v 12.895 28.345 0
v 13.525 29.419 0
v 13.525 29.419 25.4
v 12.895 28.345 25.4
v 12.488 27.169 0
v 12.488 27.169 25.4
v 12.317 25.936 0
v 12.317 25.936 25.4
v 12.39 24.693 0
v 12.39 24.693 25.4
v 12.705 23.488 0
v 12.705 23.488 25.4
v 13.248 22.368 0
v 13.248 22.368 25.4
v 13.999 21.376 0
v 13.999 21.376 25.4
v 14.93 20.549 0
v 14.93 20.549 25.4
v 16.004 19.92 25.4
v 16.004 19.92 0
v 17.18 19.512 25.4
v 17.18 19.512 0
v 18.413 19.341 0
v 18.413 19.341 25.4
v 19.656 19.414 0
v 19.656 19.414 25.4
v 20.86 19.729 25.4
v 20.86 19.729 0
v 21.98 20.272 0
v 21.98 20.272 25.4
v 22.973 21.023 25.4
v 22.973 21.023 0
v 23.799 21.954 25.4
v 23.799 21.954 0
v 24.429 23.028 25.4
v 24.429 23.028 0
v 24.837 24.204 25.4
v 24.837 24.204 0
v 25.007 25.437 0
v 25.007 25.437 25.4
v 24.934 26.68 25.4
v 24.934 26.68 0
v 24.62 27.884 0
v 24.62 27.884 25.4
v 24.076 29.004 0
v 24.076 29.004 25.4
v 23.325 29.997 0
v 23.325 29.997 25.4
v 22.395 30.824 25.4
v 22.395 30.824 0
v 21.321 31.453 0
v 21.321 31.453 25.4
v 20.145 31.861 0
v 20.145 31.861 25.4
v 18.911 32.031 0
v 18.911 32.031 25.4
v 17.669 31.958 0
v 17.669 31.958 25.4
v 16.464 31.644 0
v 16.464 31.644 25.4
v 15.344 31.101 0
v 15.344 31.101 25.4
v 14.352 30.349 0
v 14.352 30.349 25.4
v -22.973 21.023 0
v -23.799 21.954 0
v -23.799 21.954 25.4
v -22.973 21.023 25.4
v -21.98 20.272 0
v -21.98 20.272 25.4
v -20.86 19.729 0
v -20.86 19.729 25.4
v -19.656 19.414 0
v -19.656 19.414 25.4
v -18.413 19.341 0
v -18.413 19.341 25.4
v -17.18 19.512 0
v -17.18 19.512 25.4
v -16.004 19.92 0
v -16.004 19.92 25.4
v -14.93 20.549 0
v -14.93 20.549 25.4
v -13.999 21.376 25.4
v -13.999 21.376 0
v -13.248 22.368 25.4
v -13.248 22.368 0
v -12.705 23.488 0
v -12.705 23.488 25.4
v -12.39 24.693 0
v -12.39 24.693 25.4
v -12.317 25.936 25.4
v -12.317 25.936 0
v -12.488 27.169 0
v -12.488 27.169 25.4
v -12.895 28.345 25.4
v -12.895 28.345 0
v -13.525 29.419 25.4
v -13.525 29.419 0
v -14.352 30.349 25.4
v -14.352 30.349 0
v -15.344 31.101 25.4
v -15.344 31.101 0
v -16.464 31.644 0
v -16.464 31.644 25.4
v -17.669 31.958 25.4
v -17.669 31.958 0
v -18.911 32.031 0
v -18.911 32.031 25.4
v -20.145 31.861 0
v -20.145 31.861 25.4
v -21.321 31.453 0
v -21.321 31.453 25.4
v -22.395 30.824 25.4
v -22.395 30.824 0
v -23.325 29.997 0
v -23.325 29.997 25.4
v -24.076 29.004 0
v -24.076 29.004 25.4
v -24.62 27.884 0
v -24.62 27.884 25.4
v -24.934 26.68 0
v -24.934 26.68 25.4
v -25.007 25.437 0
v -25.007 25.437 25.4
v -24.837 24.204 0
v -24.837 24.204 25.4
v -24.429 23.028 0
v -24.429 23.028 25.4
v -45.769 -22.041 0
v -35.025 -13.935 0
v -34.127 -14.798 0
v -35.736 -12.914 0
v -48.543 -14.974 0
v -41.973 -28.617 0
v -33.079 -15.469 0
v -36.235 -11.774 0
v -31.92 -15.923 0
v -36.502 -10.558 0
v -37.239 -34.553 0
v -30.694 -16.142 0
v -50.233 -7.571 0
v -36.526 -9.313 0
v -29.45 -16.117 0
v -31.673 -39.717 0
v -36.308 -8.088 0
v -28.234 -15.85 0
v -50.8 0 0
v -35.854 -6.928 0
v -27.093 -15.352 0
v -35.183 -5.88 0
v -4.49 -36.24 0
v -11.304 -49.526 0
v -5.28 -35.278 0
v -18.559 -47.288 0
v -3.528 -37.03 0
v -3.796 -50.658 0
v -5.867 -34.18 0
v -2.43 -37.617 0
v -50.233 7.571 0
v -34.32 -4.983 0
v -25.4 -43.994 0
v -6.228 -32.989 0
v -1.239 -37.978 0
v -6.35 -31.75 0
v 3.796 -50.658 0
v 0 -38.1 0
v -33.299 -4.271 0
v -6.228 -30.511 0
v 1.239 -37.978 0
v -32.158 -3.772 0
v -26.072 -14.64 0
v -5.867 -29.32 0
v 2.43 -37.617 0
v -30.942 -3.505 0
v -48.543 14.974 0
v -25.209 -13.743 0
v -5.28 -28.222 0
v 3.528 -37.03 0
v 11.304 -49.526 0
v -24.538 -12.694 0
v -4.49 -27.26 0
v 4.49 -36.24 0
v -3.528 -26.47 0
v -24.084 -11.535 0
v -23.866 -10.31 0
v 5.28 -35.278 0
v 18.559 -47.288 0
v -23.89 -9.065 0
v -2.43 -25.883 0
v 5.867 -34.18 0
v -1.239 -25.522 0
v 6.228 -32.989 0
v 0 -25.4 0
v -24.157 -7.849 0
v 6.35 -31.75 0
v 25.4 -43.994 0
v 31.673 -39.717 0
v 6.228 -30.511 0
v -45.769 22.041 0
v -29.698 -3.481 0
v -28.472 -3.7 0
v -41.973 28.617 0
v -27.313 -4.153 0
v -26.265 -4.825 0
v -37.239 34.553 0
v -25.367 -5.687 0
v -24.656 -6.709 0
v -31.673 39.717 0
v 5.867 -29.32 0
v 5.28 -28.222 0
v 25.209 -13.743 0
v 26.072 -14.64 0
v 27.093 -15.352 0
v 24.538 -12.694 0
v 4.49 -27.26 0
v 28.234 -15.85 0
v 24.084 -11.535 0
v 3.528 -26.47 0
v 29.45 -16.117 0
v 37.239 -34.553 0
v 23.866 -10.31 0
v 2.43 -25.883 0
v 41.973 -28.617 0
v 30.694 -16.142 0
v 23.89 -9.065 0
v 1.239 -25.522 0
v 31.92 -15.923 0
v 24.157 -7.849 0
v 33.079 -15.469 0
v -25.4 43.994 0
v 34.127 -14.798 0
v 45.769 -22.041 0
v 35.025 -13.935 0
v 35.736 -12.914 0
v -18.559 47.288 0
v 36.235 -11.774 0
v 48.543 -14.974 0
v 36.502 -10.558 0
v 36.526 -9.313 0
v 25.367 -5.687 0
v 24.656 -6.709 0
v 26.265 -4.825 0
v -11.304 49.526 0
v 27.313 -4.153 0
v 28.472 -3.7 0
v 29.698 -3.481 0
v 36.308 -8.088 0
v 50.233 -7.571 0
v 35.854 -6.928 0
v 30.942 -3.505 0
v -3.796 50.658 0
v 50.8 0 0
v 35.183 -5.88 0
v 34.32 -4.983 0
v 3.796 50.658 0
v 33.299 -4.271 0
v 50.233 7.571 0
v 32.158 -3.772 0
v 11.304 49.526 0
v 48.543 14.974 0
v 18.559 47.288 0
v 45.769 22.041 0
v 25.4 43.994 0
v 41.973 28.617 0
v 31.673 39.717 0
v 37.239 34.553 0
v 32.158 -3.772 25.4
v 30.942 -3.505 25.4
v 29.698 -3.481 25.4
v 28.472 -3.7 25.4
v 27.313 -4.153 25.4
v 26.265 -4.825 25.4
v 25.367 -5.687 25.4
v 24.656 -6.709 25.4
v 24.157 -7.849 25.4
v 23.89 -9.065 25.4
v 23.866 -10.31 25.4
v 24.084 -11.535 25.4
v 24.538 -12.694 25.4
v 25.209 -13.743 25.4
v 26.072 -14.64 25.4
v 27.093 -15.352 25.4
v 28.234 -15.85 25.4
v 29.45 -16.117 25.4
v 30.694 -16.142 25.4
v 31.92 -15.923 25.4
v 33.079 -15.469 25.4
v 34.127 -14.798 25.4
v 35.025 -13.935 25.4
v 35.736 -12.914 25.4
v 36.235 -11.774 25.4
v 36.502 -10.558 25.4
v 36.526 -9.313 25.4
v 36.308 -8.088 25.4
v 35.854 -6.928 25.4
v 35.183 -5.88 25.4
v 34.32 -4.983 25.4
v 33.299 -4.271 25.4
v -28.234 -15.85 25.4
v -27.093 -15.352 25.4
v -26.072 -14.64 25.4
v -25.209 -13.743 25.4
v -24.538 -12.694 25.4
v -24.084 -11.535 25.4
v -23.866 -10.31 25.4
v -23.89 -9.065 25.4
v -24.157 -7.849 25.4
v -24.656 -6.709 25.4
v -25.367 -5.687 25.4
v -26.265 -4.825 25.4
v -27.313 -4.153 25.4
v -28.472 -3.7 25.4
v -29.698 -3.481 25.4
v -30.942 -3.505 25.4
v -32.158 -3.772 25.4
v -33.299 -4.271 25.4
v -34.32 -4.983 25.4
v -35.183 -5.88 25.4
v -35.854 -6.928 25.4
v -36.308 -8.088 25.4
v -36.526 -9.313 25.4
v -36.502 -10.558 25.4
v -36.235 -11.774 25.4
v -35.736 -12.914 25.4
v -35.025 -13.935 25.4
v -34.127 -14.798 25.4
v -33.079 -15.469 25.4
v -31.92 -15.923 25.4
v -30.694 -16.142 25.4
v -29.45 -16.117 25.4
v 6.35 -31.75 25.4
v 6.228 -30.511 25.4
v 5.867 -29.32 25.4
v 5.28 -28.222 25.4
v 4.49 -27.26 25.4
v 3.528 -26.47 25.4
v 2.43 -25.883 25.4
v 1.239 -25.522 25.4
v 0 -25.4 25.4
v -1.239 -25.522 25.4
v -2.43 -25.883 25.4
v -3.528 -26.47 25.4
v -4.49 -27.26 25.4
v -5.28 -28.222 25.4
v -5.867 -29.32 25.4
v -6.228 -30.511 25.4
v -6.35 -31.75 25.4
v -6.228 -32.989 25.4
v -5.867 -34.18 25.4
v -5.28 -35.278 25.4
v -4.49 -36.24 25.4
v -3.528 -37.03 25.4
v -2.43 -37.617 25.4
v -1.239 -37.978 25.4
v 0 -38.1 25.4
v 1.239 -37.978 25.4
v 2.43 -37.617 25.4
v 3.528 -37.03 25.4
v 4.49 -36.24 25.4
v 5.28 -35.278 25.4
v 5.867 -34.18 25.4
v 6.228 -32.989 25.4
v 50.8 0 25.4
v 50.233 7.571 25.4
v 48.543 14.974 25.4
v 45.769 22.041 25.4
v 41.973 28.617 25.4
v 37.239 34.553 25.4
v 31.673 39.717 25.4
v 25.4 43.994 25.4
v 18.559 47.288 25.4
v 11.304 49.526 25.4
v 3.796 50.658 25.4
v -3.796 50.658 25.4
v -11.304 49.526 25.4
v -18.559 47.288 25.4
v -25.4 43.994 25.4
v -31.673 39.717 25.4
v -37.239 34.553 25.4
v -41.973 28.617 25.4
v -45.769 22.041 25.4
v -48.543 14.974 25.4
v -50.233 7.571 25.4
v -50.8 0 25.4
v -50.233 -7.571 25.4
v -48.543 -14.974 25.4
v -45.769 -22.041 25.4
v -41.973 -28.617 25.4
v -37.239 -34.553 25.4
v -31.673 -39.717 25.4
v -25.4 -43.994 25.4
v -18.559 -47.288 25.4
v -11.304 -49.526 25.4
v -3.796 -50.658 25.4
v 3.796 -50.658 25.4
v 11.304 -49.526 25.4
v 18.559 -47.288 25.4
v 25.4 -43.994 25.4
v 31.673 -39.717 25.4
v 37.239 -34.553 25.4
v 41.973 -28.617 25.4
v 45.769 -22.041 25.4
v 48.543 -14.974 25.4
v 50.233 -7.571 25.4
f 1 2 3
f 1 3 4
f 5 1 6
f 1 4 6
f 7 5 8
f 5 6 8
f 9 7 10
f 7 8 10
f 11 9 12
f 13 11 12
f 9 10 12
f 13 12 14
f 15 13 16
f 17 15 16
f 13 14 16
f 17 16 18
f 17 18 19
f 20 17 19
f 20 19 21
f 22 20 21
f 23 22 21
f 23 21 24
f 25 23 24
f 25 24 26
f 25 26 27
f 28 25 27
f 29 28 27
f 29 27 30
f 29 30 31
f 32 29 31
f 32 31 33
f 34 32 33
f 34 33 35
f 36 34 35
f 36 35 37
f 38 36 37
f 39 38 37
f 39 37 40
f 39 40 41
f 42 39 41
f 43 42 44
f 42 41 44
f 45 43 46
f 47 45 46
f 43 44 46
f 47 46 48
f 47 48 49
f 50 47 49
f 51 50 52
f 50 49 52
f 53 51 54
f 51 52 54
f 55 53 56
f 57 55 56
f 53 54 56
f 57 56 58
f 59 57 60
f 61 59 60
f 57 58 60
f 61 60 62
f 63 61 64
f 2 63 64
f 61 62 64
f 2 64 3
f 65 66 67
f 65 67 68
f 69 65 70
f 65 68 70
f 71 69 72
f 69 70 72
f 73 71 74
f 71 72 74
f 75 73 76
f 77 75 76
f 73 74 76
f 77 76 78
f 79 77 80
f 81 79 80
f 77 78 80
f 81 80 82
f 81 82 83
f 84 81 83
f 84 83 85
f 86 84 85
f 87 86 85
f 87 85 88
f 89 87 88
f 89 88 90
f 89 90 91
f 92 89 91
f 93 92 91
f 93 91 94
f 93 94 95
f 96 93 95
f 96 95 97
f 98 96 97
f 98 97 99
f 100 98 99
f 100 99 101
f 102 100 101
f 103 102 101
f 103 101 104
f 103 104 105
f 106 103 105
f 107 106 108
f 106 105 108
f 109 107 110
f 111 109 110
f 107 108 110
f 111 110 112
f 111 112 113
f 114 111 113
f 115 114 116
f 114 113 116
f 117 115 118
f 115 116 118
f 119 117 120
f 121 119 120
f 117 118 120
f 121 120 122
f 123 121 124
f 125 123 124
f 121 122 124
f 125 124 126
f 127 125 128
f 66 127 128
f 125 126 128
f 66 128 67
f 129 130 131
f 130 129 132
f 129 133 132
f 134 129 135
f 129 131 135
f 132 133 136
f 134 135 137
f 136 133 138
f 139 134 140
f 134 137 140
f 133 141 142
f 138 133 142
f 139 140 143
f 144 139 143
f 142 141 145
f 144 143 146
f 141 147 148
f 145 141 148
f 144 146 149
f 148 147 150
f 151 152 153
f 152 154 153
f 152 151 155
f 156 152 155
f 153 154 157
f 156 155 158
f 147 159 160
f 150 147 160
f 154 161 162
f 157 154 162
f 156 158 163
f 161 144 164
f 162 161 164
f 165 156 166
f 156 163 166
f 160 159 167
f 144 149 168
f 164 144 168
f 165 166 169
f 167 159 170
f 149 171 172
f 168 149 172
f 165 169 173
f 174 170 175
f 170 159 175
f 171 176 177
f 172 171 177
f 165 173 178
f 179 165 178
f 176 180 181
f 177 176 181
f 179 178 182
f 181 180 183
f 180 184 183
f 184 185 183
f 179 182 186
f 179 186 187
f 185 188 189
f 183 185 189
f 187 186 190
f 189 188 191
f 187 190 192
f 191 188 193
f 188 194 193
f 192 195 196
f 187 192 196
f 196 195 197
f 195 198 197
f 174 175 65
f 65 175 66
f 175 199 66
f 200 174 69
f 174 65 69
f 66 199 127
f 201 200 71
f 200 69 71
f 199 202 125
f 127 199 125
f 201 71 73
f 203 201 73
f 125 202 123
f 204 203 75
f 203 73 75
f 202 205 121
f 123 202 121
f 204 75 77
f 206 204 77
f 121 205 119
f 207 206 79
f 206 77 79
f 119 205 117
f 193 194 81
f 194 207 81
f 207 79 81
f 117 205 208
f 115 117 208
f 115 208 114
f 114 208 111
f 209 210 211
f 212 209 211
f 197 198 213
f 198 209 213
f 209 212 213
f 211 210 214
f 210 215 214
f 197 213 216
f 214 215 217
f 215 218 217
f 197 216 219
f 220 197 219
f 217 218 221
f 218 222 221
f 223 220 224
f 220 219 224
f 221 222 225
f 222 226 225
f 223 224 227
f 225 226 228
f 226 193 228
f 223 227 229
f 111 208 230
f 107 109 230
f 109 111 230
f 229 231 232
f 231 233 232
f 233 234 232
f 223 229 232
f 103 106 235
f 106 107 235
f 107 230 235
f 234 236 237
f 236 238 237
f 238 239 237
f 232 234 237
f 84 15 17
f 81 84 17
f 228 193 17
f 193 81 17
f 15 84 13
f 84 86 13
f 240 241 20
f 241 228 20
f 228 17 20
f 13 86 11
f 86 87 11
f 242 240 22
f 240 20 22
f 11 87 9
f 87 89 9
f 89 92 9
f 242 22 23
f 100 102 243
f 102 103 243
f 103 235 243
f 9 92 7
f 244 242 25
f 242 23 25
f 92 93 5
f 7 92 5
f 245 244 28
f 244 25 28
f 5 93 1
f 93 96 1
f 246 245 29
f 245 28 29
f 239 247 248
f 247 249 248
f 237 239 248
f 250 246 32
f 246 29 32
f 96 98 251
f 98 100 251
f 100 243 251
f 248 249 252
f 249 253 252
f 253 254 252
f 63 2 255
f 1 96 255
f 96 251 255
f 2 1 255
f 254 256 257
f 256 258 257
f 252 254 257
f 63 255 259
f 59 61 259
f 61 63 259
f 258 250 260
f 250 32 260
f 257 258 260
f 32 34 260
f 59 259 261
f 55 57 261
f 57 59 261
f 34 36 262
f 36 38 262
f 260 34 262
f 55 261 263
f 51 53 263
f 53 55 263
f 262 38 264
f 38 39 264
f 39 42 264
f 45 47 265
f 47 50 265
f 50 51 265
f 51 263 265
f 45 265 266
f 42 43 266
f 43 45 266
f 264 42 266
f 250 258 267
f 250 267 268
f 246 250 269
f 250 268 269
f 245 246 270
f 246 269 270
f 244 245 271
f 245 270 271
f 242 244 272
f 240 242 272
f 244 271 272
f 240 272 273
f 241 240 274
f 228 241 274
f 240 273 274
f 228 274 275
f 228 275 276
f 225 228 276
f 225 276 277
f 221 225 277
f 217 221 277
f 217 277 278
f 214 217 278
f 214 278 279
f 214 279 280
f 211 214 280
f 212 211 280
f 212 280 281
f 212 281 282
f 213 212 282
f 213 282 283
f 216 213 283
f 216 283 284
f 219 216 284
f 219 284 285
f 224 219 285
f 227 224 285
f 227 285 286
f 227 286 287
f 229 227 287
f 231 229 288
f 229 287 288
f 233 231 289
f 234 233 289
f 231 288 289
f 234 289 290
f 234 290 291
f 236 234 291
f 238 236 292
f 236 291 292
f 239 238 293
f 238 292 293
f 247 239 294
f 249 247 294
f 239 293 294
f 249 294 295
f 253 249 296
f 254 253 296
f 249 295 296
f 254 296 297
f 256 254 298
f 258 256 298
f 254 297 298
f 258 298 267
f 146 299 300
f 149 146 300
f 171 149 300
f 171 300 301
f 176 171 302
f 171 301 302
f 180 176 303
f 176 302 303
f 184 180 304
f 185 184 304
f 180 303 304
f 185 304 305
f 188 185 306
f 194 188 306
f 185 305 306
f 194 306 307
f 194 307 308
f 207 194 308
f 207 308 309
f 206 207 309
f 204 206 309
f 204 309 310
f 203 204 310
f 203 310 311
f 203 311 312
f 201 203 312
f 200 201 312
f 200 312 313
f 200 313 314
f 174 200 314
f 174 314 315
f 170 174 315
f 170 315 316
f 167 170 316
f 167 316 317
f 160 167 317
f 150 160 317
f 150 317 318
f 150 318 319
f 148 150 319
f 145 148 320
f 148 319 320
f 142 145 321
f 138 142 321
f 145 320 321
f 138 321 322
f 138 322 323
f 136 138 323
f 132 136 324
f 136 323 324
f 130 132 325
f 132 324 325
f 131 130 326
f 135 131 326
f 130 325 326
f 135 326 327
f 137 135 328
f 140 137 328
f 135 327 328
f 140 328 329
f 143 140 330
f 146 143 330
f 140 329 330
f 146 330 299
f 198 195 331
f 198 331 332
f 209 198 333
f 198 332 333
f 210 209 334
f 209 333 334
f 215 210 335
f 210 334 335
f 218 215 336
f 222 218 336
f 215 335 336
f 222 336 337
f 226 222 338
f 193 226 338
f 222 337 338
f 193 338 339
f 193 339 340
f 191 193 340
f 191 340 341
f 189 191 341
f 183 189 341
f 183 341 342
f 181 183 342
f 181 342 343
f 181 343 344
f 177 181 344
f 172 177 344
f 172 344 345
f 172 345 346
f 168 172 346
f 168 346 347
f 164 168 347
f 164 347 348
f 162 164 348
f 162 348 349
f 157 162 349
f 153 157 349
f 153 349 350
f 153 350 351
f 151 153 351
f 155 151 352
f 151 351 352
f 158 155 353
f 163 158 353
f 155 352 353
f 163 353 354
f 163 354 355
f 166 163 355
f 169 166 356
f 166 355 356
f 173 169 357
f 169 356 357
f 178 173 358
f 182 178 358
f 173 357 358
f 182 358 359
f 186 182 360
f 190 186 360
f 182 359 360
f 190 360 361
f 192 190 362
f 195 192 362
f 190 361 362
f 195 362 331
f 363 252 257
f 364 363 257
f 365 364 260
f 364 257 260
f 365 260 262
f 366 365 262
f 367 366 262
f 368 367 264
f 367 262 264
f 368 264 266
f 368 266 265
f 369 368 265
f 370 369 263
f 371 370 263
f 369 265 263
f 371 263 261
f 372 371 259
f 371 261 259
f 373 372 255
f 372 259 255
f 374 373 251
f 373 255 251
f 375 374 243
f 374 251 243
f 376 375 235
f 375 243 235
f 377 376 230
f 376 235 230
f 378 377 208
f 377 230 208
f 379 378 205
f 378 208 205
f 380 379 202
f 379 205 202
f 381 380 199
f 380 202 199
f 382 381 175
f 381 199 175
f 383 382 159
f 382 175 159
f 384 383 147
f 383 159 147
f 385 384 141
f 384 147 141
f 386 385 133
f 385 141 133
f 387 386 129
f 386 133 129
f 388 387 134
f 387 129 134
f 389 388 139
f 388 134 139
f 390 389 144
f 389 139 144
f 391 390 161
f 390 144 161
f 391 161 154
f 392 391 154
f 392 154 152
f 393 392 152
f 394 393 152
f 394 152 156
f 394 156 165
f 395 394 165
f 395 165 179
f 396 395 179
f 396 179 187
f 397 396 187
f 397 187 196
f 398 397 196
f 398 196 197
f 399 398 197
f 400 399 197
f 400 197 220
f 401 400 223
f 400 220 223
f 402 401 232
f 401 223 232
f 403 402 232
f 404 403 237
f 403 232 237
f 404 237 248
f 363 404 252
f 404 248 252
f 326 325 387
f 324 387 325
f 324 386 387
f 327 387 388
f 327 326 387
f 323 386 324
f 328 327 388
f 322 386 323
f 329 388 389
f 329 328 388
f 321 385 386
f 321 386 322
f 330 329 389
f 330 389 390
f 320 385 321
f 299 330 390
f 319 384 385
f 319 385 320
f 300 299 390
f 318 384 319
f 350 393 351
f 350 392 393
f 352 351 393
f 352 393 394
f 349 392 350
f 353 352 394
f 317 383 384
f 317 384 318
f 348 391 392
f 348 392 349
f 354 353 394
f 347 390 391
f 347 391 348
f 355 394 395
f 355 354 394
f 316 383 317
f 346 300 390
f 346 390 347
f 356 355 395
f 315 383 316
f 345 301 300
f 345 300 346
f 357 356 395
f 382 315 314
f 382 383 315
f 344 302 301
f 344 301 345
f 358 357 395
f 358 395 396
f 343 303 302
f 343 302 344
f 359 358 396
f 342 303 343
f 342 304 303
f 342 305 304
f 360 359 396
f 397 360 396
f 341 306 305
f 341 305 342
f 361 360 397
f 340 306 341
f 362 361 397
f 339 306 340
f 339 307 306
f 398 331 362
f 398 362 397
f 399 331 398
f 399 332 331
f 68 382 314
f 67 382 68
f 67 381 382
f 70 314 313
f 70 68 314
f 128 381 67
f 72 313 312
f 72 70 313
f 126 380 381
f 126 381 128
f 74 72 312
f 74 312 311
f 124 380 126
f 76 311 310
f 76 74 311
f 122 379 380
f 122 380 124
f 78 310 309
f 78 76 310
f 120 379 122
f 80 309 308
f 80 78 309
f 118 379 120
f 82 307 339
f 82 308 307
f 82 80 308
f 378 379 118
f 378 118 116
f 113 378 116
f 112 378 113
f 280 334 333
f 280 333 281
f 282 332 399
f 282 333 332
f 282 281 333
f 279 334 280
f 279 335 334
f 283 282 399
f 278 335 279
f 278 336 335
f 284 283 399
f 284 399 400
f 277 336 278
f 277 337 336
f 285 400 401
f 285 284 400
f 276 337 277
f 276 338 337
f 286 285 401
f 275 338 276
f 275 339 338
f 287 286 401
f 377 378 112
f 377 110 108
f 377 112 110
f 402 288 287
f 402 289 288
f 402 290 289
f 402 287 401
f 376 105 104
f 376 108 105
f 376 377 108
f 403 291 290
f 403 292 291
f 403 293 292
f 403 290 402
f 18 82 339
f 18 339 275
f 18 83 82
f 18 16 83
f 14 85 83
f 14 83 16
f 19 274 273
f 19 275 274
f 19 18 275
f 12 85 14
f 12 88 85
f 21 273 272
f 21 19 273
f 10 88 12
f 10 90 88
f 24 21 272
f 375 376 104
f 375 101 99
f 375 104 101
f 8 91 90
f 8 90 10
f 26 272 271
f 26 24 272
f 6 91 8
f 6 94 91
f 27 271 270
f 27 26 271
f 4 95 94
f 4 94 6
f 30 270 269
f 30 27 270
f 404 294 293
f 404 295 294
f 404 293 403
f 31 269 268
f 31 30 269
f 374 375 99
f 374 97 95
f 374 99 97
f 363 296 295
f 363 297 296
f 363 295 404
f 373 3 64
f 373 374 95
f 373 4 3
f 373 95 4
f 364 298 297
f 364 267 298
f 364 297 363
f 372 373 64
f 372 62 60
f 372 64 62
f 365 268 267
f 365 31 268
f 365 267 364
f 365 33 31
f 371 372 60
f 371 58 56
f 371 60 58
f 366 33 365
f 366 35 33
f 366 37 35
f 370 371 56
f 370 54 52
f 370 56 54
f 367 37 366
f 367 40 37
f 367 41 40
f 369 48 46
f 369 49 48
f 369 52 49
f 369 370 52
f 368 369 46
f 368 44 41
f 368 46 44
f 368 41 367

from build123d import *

# Parameters (mm, degrees)
F0_R            = 50.8
F1_DEPTH        = 25.4
F2_R            = 6.35
F4_DEPTH        = 25.401
F4_COPIES_COUNT = 5


# Not quite as in the source:
# - a pattern or mirror of a feature is missing from the dataset's text; its kind, count and spacing are read off the source's solid


with BuildPart() as f1:
    # F0 (on Top) → F1 (new body)
    with BuildSketch(Plane.XY):
        Circle(F0_R)
    extrude(amount=F1_DEPTH)

    # F2 (on face) → F4 (cut, through all)
    with BuildSketch(Plane.XY.offset(25.4)):
        with Locations((0, -31.75)):
            Circle(F2_R)
    f4 = extrude(amount=-F4_DEPTH, mode=Mode.SUBTRACT)

    # F4_copies: F4 ×5 about axis
    f4_copies_axis = Axis((0, 0, 0), (0, 0, 1))
    for i in range(1, F4_COPIES_COUNT):
        add(f4.rotate(f4_copies_axis, i * 360 / F4_COPIES_COUNT), mode=Mode.SUBTRACT)


solid = f1.part
